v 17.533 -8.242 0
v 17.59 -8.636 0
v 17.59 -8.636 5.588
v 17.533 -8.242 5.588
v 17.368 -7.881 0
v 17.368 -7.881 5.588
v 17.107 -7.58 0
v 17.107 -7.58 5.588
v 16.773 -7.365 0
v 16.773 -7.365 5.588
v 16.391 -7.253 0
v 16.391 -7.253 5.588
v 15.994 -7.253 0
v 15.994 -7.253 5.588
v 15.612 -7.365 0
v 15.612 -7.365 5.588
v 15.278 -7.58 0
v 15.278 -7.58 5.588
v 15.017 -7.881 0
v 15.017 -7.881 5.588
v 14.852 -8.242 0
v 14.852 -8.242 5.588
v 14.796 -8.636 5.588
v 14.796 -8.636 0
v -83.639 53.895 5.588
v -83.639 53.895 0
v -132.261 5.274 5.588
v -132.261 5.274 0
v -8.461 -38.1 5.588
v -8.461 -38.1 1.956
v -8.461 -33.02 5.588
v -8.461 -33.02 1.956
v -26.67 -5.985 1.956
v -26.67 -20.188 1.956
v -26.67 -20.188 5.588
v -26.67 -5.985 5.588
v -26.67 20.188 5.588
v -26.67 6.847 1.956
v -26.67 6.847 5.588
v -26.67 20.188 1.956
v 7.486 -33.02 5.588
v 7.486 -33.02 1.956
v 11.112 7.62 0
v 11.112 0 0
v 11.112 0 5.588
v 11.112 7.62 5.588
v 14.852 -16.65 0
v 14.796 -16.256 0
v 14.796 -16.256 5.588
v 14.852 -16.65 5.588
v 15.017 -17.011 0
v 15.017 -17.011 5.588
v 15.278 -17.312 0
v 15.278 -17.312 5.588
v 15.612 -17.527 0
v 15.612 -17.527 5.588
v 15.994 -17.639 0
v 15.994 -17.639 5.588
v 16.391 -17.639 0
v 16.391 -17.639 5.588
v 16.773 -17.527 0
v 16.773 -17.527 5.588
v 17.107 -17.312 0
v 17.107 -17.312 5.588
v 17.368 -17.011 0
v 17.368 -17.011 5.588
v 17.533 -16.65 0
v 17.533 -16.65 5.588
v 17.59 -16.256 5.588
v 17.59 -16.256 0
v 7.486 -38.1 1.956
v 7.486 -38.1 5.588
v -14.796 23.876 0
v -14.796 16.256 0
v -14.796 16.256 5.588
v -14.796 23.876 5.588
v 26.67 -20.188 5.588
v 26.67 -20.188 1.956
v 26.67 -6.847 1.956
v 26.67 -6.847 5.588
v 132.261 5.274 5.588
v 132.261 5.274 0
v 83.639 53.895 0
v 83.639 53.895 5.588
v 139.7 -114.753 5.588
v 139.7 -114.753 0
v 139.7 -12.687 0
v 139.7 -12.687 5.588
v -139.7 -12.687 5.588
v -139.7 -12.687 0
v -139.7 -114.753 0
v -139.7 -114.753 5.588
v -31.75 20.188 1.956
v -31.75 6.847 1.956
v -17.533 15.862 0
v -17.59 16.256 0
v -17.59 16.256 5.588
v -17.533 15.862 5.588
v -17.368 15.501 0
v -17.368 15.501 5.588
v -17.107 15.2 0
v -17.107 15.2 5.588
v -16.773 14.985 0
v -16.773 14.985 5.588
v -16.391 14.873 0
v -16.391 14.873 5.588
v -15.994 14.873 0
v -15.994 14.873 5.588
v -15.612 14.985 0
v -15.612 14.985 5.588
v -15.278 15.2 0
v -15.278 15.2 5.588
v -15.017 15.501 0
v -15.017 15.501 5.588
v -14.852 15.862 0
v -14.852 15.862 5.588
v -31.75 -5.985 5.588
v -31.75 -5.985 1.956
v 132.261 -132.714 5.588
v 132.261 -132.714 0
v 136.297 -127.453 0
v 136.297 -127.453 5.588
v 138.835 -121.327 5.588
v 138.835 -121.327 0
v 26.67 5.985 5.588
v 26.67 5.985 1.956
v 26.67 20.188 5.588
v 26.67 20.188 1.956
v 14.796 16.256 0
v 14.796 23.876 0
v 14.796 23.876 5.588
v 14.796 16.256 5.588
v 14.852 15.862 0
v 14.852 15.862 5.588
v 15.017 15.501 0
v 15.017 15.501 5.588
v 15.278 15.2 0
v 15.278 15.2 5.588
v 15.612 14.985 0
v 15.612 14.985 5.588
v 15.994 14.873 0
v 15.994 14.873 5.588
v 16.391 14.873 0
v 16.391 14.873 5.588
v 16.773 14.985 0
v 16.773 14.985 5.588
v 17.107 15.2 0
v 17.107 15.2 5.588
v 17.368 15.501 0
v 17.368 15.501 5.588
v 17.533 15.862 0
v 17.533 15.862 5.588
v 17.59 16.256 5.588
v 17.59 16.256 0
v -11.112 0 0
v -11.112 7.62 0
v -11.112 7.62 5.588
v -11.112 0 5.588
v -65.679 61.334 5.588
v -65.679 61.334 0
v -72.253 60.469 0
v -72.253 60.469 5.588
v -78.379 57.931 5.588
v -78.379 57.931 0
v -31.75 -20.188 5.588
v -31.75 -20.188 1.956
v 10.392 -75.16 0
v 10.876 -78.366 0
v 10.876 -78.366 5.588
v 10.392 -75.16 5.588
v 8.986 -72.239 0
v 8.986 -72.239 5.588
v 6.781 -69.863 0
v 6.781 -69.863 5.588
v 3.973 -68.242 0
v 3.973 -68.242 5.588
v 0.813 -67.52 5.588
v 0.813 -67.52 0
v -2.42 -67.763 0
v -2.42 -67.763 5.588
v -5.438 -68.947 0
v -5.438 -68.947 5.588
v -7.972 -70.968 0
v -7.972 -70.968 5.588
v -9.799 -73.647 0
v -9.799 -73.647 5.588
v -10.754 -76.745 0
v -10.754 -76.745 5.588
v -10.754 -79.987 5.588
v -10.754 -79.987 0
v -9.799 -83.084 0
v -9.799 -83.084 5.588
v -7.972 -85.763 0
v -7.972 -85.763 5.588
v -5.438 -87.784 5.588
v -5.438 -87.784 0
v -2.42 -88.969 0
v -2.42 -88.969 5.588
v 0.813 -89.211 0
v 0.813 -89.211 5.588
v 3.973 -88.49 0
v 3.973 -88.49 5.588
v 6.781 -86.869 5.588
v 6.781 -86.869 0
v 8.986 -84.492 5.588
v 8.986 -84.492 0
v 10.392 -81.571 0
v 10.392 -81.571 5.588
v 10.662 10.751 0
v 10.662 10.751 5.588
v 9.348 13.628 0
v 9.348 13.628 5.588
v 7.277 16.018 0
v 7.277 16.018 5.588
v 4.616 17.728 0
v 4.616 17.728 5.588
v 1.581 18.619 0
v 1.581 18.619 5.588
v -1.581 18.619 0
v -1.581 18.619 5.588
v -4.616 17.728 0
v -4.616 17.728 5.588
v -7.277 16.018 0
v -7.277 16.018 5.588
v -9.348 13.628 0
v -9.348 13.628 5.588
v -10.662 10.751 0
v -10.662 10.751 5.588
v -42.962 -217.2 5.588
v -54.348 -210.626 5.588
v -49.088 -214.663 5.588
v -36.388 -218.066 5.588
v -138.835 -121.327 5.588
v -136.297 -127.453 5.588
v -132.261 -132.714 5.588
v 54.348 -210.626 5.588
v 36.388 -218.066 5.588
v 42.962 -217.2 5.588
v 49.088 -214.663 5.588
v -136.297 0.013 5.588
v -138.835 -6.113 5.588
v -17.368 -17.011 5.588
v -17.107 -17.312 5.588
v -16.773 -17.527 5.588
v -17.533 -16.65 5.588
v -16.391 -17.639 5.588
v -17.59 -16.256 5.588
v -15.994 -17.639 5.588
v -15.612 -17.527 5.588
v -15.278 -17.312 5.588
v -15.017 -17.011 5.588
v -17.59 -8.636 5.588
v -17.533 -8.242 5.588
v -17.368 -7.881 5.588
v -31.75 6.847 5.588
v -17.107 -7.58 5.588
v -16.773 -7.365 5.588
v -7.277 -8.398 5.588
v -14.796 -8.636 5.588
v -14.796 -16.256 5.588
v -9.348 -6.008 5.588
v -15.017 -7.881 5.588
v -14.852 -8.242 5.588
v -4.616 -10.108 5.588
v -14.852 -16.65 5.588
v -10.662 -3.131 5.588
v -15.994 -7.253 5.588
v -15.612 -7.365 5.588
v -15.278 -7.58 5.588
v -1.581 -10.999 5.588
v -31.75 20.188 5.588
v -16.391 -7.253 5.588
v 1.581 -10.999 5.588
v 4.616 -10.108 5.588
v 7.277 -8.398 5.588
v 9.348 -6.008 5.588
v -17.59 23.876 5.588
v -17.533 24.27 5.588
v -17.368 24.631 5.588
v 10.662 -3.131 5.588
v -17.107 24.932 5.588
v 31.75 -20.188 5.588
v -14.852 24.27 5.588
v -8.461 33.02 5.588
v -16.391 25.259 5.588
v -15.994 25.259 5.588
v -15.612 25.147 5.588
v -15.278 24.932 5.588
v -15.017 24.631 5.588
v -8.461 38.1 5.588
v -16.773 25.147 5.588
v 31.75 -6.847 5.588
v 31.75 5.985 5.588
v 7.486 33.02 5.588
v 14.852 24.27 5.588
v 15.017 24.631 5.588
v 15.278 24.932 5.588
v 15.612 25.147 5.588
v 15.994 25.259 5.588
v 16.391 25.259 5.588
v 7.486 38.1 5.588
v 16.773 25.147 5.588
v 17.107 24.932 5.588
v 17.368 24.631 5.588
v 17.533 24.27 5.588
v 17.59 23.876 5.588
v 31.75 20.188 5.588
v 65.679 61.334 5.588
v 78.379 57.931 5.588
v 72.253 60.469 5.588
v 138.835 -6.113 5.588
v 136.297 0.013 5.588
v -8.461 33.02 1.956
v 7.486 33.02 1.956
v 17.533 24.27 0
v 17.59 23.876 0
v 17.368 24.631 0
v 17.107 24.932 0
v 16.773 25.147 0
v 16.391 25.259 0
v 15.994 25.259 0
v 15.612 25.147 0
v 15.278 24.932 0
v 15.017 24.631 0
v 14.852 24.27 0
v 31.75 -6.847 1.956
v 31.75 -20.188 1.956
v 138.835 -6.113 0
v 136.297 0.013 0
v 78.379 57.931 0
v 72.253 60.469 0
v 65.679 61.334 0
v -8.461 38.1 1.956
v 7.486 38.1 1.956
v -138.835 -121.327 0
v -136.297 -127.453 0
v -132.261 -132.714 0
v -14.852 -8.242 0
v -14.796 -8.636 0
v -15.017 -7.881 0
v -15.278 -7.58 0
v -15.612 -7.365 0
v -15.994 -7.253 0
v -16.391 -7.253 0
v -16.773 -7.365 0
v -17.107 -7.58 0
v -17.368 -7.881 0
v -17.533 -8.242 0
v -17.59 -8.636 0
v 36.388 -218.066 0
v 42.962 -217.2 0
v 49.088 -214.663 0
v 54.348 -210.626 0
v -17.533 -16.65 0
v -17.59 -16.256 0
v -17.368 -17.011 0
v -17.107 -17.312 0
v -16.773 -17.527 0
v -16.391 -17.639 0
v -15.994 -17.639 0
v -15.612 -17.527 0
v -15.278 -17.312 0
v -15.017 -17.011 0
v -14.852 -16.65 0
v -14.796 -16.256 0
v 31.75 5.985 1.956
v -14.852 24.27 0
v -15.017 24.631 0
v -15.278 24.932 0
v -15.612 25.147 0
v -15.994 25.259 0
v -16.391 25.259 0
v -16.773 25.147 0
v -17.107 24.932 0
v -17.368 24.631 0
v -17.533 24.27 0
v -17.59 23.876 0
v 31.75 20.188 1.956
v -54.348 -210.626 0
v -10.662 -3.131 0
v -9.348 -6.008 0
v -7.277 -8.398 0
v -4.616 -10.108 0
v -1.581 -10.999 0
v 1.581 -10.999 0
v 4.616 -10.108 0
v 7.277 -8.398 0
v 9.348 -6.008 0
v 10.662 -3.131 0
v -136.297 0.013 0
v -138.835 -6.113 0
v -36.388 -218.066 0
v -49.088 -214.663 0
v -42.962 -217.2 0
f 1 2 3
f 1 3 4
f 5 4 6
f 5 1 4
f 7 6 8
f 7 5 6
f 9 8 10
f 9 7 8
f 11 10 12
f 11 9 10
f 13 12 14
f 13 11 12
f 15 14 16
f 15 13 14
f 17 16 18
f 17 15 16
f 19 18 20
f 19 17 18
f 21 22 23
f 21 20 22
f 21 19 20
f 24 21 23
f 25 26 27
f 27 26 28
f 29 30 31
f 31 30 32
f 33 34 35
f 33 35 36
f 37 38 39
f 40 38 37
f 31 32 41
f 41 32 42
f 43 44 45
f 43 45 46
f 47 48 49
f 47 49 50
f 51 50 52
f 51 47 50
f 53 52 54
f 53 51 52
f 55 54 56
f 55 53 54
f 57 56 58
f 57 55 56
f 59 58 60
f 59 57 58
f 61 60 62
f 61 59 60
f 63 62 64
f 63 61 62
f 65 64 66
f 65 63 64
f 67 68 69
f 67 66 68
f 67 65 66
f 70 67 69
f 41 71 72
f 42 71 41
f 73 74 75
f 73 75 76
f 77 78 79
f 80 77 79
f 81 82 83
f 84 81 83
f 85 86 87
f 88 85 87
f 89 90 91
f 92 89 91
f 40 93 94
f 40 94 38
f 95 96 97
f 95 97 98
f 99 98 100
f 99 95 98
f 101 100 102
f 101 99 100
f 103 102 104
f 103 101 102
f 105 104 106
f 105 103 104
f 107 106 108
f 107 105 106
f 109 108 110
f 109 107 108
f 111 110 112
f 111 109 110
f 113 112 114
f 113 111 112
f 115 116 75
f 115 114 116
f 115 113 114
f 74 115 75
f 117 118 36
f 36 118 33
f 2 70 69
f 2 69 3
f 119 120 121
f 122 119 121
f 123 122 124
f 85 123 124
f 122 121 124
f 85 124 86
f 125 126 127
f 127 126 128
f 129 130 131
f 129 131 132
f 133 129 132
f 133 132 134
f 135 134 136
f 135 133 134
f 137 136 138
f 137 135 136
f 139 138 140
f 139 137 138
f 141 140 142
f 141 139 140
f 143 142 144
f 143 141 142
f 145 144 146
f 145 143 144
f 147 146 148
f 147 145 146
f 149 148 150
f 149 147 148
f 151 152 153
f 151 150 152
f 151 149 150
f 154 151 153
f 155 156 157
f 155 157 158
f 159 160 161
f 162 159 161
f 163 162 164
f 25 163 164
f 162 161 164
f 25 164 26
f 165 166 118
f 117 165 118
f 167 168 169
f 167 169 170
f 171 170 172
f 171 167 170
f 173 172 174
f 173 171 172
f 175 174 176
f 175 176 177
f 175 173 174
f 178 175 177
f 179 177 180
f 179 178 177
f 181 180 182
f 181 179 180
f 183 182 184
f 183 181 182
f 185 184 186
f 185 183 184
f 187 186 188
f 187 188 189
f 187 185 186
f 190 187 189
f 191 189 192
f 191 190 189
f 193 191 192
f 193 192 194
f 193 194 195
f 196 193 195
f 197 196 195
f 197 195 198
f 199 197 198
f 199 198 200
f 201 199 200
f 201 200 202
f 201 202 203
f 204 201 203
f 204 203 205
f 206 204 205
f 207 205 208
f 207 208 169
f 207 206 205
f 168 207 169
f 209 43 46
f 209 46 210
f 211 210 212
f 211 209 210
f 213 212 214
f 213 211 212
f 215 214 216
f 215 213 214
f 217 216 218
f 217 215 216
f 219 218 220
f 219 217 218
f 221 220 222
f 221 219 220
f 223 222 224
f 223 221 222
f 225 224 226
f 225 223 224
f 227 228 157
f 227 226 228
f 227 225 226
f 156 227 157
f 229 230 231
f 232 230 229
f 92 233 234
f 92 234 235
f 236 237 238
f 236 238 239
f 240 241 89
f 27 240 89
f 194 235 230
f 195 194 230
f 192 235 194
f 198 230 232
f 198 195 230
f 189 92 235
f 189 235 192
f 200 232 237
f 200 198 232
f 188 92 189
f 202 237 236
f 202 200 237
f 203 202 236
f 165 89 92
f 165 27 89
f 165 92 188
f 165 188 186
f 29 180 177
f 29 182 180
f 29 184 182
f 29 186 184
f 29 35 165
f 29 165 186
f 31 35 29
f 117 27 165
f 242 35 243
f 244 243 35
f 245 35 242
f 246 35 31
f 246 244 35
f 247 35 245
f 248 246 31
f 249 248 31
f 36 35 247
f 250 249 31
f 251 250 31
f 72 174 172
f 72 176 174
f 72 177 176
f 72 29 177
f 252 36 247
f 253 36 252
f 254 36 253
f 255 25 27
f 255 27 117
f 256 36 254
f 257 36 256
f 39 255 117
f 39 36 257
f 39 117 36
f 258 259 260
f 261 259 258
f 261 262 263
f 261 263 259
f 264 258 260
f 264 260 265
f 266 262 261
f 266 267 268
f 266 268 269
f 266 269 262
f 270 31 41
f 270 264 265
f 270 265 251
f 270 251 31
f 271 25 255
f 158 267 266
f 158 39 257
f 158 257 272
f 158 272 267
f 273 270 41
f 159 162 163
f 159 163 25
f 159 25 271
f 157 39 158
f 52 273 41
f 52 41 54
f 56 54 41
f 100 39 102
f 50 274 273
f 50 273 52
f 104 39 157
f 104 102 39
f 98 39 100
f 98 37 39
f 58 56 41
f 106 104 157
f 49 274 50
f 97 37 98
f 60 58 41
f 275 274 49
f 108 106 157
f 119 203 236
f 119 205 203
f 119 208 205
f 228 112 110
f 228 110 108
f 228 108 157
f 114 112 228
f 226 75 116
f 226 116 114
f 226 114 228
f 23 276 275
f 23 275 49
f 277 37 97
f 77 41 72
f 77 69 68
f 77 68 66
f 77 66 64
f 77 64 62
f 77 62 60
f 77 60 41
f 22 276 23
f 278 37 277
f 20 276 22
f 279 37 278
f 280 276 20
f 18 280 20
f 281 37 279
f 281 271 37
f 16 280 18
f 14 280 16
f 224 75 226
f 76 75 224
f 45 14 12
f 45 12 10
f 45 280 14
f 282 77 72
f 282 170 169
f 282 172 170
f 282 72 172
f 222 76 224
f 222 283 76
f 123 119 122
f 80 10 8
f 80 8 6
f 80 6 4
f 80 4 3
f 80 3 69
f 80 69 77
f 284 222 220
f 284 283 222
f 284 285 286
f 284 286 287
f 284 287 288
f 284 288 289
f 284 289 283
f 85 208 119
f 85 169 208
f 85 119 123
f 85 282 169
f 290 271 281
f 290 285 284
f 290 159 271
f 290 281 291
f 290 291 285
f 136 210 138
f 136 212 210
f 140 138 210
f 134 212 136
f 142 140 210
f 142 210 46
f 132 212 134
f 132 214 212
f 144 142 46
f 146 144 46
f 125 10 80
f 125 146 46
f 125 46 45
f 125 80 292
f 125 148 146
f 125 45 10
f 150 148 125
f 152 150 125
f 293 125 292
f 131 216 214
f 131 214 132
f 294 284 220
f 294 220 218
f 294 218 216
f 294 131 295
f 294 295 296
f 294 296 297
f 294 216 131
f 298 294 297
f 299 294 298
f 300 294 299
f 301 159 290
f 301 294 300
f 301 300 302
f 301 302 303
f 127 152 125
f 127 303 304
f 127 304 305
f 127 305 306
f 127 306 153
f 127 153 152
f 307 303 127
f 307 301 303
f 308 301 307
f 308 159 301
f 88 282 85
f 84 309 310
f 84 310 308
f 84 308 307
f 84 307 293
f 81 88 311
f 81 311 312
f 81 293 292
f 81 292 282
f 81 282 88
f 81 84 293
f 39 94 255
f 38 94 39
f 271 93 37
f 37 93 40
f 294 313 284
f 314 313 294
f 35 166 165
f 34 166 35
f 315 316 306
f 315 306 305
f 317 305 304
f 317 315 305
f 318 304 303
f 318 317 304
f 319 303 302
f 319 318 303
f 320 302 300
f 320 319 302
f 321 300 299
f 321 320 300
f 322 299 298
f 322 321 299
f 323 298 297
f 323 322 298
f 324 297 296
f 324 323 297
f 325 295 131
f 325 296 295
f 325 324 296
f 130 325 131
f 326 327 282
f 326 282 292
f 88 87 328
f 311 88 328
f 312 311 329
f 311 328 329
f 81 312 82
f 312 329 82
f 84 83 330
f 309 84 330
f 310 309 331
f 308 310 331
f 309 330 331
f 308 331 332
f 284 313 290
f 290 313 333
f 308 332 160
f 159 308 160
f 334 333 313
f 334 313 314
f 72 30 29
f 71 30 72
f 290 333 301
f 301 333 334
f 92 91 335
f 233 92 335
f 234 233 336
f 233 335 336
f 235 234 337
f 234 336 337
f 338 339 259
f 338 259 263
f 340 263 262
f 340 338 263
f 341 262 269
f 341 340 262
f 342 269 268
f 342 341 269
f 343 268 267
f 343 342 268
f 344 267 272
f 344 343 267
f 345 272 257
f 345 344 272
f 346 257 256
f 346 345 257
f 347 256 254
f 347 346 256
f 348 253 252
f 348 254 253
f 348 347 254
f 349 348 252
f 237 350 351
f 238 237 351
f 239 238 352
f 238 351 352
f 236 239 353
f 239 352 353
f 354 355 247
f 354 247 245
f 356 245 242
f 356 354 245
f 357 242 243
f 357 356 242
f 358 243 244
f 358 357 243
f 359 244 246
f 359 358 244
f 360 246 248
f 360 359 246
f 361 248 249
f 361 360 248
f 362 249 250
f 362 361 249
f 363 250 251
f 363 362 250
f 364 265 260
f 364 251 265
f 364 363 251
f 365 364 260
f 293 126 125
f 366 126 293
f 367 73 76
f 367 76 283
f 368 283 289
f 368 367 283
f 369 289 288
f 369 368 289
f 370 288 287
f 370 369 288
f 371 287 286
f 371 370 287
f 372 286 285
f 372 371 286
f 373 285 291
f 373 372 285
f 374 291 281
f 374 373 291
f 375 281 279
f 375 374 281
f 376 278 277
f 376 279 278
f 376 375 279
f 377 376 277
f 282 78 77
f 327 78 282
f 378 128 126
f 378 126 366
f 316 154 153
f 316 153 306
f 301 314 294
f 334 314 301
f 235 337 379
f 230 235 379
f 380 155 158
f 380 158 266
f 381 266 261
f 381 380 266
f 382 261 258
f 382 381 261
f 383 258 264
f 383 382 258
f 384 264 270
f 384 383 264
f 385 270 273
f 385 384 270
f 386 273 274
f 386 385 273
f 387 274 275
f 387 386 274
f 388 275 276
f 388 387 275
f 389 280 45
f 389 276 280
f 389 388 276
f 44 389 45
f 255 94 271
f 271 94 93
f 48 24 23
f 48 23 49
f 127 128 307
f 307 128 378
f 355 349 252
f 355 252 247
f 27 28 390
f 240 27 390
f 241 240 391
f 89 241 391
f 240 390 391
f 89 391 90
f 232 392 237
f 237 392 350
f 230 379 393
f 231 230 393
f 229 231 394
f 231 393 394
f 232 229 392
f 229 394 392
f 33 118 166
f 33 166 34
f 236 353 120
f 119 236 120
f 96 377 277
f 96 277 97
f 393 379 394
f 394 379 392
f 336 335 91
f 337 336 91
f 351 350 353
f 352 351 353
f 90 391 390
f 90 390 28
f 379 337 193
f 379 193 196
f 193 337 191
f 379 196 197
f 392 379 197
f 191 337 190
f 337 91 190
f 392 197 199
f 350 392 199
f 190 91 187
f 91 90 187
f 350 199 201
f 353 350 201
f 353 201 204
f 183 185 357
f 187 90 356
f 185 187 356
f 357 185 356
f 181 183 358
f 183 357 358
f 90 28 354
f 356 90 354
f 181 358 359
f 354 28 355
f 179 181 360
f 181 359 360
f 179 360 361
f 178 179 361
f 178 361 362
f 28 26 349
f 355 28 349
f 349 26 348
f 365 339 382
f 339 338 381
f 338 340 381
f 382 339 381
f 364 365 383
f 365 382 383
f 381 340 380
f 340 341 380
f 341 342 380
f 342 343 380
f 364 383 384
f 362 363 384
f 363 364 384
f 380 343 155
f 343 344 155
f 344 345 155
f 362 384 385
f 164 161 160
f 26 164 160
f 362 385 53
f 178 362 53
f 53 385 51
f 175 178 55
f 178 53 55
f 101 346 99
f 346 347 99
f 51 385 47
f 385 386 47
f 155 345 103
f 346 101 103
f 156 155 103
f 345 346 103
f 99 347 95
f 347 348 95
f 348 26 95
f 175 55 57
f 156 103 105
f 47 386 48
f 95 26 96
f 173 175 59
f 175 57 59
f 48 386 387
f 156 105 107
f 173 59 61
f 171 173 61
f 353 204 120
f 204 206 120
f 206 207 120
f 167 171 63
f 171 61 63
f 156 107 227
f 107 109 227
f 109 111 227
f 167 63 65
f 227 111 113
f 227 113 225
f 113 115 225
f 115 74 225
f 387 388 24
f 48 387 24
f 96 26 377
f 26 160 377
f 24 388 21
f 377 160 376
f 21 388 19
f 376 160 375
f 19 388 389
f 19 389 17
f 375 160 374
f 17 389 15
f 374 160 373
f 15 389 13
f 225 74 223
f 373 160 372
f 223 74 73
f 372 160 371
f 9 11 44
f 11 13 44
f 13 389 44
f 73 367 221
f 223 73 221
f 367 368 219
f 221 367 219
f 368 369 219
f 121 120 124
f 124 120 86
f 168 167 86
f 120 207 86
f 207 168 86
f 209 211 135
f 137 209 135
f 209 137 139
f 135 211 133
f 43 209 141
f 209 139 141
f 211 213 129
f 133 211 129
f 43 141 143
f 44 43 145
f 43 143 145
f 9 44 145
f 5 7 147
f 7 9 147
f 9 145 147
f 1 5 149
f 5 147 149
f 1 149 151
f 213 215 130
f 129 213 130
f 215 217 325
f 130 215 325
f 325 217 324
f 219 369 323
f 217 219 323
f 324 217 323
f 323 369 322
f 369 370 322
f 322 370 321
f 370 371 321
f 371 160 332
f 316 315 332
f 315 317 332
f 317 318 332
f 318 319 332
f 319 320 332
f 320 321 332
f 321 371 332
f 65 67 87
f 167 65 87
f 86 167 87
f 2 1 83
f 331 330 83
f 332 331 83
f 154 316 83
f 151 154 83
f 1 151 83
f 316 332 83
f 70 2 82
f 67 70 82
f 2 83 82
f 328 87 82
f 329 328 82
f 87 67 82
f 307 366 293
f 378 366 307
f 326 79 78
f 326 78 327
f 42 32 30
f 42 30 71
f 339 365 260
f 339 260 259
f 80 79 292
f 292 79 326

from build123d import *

# Parameters (mm, degrees)
BOSS_EXTRUDE1_DEPTH = 5.588
CUT_EXTRUDE1_DEPTH  = 260.036579176
CUT_EXTRUDE2_DEPTH  = 260.036579176
CUT_EXTRUDE3_DEPTH  = 260.036579176
CAVITY1_START       = 1.9558
CAVITY1_OUTLINE_W   = 15.946260678
CAVITY1_OUTLINE_H   = 5.08
CAVITY1_OUTLINE_W_2 = 5.08
CAVITY1_OUTLINE_H_2 = 14.202900977
CAVITY1_OUTLINE_H_3 = 13.341513611
CAVITY1_DEPTH       = 3.6322
CAVITY2_OUTLINE_R   = 10.875645
CAVITY2_DEPTH       = 5.588


# Read off the part's stored shape, not the designer's step: Cavity1, Cavity2
with BuildPart() as part:
    # Sketch1 → Boss-Extrude1 (new body)
    with BuildSketch(Plane.XY):
        with BuildLine():
            Line((65.678975516, 61.334336478), (-65.678975516, 61.334336478))
            ThreePointArc((-65.678975516, 61.334336478), (-75.399134698, 59.400876604), (-83.639487758, 53.89484872))
            Line((-83.639487758, 53.89484872), (-132.260512242, 5.273824236))
            ThreePointArc((-132.260512242, 5.273824236), (-137.766540126, -2.966528824), (-139.7, -12.686688006))
            Line((-139.7, -12.686688006), (-139.7, -114.753454114))
            ThreePointArc((-139.7, -114.753454114), (-137.766540126, -124.473613296), (-132.260512242, -132.713966356))
            Line((-132.260512242, -132.713966356), (-54.348302834, -210.626175764))
            ThreePointArc((-54.348302834, -210.626175764), (-46.107949774, -216.132203648), (-36.387790592, -218.065663522))
            Line((-36.387790592, -218.065663522), (36.387790592, -218.065663522))
            ThreePointArc((36.387790592, -218.065663522), (46.107949774, -216.132203648), (54.348302834, -210.626175764))
            Line((54.348302834, -210.626175764), (132.260512242, -132.713966356))
            ThreePointArc((132.260512242, -132.713966356), (137.766540126, -124.473613296), (139.7, -114.753454114))
            Line((139.7, -114.753454114), (139.7, -12.686688006))
            ThreePointArc((139.7, -12.686688006), (137.766540126, -2.966528824), (132.260512242, 5.273824236))
            Line((132.260512242, 5.273824236), (83.639487758, 53.89484872))
            ThreePointArc((83.639487758, 53.89484872), (75.399134698, 59.400876604), (65.678975516, 61.334336478))
        make_face()
    extrude(amount=BOSS_EXTRUDE1_DEPTH)

    # Sketch3 → Cut-Extrude1 (cut, through all)
    with BuildSketch(Plane(origin=(0, 0, 0), x_dir=(-1, 0, 0), z_dir=(0, 0, -1))):
        with BuildLine():
            Line((-17.5895, 16.256), (-17.5895, 23.876))
            ThreePointArc((-17.5895, 23.876), (-16.1925, 25.273), (-14.7955, 23.876))
            Line((-14.7955, 23.876), (-14.7955, 16.256))
            ThreePointArc((-14.7955, 16.256), (-16.1925, 14.859), (-17.5895, 16.256))
        make_face()
        with BuildLine():
            Line((14.7955, 16.256), (14.7955, 23.876))
            ThreePointArc((14.7955, 23.876), (16.1925, 25.273), (17.5895, 23.876))
            Line((17.5895, 23.876), (17.5895, 16.256))
            ThreePointArc((17.5895, 16.256), (16.1925, 14.859), (14.7955, 16.256))
        make_face()
        with BuildLine():
            Line((-17.5895, -16.256), (-17.5895, -8.636))
            ThreePointArc((-17.5895, -8.636), (-16.1925, -7.239), (-14.7955, -8.636))
            Line((-14.7955, -8.636), (-14.7955, -16.256))
            ThreePointArc((-14.7955, -16.256), (-16.1925, -17.653), (-17.5895, -16.256))
        make_face()
    extrude(amount=-CUT_EXTRUDE1_DEPTH, mode=Mode.SUBTRACT)

    # Sketch6 → Cut-Extrude2 (cut, through all)
    with BuildSketch(Plane(origin=(0, 0, 0), x_dir=(-1, 0, 0), z_dir=(0, 0, -1))):
        with BuildLine():
            Line((-11.1125, 0), (-11.1125, 7.62))
            ThreePointArc((-11.1125, 7.62), (0, 18.7325), (11.1125, 7.62))
            Line((11.1125, 7.62), (11.1125, 0))
            ThreePointArc((11.1125, 0), (0, -11.1125), (-11.1125, 0))
        make_face()
    extrude(amount=-CUT_EXTRUDE2_DEPTH, mode=Mode.SUBTRACT)

    # Sketch5 → Cut-Extrude3 (cut, through all)
    with BuildSketch(Plane(origin=(0, 0, 0), x_dir=(-1, 0, 0), z_dir=(0, 0, -1))):
        with BuildLine():
            Line((14.7955, -16.256), (14.7955, -8.636))
            ThreePointArc((14.7955, -8.636), (16.1925, -7.239), (17.5895, -8.636))
            Line((17.5895, -8.636), (17.5895, -16.256))
            ThreePointArc((17.5895, -16.256), (16.1925, -17.653), (14.7955, -16.256))
        make_face()
    extrude(amount=-CUT_EXTRUDE3_DEPTH, mode=Mode.SUBTRACT)

    # Cavity1 outline → Cavity1 (cut)
    with BuildSketch(Plane.XY.offset(CAVITY1_START)):
        with Locations((-0.487430597, 35.56)):
            Rectangle(CAVITY1_OUTLINE_W, CAVITY1_OUTLINE_H)
        with Locations((-0.487430597, -35.56)):
            Rectangle(CAVITY1_OUTLINE_W, CAVITY1_OUTLINE_H)
        with Locations((29.21, 13.086687708)):
            Rectangle(CAVITY1_OUTLINE_W_2, CAVITY1_OUTLINE_H_2)
        with Locations((-29.21, 13.517381391)):
            Rectangle(CAVITY1_OUTLINE_W_2, CAVITY1_OUTLINE_H_3)
        with Locations((29.21, -13.517381391)):
            Rectangle(CAVITY1_OUTLINE_W_2, CAVITY1_OUTLINE_H_3)
        with Locations((-29.21, -13.086687708)):
            Rectangle(CAVITY1_OUTLINE_W_2, CAVITY1_OUTLINE_H_2)
    extrude(amount=CAVITY1_DEPTH, mode=Mode.SUBTRACT)

    # Cavity2 outline → Cavity2 (cut)
    with BuildSketch(Plane.XY):
        with Locations((0, -78.365663522)):
            Circle(CAVITY2_OUTLINE_R)
    extrude(amount=CAVITY2_DEPTH, mode=Mode.SUBTRACT)


solid = part.part
